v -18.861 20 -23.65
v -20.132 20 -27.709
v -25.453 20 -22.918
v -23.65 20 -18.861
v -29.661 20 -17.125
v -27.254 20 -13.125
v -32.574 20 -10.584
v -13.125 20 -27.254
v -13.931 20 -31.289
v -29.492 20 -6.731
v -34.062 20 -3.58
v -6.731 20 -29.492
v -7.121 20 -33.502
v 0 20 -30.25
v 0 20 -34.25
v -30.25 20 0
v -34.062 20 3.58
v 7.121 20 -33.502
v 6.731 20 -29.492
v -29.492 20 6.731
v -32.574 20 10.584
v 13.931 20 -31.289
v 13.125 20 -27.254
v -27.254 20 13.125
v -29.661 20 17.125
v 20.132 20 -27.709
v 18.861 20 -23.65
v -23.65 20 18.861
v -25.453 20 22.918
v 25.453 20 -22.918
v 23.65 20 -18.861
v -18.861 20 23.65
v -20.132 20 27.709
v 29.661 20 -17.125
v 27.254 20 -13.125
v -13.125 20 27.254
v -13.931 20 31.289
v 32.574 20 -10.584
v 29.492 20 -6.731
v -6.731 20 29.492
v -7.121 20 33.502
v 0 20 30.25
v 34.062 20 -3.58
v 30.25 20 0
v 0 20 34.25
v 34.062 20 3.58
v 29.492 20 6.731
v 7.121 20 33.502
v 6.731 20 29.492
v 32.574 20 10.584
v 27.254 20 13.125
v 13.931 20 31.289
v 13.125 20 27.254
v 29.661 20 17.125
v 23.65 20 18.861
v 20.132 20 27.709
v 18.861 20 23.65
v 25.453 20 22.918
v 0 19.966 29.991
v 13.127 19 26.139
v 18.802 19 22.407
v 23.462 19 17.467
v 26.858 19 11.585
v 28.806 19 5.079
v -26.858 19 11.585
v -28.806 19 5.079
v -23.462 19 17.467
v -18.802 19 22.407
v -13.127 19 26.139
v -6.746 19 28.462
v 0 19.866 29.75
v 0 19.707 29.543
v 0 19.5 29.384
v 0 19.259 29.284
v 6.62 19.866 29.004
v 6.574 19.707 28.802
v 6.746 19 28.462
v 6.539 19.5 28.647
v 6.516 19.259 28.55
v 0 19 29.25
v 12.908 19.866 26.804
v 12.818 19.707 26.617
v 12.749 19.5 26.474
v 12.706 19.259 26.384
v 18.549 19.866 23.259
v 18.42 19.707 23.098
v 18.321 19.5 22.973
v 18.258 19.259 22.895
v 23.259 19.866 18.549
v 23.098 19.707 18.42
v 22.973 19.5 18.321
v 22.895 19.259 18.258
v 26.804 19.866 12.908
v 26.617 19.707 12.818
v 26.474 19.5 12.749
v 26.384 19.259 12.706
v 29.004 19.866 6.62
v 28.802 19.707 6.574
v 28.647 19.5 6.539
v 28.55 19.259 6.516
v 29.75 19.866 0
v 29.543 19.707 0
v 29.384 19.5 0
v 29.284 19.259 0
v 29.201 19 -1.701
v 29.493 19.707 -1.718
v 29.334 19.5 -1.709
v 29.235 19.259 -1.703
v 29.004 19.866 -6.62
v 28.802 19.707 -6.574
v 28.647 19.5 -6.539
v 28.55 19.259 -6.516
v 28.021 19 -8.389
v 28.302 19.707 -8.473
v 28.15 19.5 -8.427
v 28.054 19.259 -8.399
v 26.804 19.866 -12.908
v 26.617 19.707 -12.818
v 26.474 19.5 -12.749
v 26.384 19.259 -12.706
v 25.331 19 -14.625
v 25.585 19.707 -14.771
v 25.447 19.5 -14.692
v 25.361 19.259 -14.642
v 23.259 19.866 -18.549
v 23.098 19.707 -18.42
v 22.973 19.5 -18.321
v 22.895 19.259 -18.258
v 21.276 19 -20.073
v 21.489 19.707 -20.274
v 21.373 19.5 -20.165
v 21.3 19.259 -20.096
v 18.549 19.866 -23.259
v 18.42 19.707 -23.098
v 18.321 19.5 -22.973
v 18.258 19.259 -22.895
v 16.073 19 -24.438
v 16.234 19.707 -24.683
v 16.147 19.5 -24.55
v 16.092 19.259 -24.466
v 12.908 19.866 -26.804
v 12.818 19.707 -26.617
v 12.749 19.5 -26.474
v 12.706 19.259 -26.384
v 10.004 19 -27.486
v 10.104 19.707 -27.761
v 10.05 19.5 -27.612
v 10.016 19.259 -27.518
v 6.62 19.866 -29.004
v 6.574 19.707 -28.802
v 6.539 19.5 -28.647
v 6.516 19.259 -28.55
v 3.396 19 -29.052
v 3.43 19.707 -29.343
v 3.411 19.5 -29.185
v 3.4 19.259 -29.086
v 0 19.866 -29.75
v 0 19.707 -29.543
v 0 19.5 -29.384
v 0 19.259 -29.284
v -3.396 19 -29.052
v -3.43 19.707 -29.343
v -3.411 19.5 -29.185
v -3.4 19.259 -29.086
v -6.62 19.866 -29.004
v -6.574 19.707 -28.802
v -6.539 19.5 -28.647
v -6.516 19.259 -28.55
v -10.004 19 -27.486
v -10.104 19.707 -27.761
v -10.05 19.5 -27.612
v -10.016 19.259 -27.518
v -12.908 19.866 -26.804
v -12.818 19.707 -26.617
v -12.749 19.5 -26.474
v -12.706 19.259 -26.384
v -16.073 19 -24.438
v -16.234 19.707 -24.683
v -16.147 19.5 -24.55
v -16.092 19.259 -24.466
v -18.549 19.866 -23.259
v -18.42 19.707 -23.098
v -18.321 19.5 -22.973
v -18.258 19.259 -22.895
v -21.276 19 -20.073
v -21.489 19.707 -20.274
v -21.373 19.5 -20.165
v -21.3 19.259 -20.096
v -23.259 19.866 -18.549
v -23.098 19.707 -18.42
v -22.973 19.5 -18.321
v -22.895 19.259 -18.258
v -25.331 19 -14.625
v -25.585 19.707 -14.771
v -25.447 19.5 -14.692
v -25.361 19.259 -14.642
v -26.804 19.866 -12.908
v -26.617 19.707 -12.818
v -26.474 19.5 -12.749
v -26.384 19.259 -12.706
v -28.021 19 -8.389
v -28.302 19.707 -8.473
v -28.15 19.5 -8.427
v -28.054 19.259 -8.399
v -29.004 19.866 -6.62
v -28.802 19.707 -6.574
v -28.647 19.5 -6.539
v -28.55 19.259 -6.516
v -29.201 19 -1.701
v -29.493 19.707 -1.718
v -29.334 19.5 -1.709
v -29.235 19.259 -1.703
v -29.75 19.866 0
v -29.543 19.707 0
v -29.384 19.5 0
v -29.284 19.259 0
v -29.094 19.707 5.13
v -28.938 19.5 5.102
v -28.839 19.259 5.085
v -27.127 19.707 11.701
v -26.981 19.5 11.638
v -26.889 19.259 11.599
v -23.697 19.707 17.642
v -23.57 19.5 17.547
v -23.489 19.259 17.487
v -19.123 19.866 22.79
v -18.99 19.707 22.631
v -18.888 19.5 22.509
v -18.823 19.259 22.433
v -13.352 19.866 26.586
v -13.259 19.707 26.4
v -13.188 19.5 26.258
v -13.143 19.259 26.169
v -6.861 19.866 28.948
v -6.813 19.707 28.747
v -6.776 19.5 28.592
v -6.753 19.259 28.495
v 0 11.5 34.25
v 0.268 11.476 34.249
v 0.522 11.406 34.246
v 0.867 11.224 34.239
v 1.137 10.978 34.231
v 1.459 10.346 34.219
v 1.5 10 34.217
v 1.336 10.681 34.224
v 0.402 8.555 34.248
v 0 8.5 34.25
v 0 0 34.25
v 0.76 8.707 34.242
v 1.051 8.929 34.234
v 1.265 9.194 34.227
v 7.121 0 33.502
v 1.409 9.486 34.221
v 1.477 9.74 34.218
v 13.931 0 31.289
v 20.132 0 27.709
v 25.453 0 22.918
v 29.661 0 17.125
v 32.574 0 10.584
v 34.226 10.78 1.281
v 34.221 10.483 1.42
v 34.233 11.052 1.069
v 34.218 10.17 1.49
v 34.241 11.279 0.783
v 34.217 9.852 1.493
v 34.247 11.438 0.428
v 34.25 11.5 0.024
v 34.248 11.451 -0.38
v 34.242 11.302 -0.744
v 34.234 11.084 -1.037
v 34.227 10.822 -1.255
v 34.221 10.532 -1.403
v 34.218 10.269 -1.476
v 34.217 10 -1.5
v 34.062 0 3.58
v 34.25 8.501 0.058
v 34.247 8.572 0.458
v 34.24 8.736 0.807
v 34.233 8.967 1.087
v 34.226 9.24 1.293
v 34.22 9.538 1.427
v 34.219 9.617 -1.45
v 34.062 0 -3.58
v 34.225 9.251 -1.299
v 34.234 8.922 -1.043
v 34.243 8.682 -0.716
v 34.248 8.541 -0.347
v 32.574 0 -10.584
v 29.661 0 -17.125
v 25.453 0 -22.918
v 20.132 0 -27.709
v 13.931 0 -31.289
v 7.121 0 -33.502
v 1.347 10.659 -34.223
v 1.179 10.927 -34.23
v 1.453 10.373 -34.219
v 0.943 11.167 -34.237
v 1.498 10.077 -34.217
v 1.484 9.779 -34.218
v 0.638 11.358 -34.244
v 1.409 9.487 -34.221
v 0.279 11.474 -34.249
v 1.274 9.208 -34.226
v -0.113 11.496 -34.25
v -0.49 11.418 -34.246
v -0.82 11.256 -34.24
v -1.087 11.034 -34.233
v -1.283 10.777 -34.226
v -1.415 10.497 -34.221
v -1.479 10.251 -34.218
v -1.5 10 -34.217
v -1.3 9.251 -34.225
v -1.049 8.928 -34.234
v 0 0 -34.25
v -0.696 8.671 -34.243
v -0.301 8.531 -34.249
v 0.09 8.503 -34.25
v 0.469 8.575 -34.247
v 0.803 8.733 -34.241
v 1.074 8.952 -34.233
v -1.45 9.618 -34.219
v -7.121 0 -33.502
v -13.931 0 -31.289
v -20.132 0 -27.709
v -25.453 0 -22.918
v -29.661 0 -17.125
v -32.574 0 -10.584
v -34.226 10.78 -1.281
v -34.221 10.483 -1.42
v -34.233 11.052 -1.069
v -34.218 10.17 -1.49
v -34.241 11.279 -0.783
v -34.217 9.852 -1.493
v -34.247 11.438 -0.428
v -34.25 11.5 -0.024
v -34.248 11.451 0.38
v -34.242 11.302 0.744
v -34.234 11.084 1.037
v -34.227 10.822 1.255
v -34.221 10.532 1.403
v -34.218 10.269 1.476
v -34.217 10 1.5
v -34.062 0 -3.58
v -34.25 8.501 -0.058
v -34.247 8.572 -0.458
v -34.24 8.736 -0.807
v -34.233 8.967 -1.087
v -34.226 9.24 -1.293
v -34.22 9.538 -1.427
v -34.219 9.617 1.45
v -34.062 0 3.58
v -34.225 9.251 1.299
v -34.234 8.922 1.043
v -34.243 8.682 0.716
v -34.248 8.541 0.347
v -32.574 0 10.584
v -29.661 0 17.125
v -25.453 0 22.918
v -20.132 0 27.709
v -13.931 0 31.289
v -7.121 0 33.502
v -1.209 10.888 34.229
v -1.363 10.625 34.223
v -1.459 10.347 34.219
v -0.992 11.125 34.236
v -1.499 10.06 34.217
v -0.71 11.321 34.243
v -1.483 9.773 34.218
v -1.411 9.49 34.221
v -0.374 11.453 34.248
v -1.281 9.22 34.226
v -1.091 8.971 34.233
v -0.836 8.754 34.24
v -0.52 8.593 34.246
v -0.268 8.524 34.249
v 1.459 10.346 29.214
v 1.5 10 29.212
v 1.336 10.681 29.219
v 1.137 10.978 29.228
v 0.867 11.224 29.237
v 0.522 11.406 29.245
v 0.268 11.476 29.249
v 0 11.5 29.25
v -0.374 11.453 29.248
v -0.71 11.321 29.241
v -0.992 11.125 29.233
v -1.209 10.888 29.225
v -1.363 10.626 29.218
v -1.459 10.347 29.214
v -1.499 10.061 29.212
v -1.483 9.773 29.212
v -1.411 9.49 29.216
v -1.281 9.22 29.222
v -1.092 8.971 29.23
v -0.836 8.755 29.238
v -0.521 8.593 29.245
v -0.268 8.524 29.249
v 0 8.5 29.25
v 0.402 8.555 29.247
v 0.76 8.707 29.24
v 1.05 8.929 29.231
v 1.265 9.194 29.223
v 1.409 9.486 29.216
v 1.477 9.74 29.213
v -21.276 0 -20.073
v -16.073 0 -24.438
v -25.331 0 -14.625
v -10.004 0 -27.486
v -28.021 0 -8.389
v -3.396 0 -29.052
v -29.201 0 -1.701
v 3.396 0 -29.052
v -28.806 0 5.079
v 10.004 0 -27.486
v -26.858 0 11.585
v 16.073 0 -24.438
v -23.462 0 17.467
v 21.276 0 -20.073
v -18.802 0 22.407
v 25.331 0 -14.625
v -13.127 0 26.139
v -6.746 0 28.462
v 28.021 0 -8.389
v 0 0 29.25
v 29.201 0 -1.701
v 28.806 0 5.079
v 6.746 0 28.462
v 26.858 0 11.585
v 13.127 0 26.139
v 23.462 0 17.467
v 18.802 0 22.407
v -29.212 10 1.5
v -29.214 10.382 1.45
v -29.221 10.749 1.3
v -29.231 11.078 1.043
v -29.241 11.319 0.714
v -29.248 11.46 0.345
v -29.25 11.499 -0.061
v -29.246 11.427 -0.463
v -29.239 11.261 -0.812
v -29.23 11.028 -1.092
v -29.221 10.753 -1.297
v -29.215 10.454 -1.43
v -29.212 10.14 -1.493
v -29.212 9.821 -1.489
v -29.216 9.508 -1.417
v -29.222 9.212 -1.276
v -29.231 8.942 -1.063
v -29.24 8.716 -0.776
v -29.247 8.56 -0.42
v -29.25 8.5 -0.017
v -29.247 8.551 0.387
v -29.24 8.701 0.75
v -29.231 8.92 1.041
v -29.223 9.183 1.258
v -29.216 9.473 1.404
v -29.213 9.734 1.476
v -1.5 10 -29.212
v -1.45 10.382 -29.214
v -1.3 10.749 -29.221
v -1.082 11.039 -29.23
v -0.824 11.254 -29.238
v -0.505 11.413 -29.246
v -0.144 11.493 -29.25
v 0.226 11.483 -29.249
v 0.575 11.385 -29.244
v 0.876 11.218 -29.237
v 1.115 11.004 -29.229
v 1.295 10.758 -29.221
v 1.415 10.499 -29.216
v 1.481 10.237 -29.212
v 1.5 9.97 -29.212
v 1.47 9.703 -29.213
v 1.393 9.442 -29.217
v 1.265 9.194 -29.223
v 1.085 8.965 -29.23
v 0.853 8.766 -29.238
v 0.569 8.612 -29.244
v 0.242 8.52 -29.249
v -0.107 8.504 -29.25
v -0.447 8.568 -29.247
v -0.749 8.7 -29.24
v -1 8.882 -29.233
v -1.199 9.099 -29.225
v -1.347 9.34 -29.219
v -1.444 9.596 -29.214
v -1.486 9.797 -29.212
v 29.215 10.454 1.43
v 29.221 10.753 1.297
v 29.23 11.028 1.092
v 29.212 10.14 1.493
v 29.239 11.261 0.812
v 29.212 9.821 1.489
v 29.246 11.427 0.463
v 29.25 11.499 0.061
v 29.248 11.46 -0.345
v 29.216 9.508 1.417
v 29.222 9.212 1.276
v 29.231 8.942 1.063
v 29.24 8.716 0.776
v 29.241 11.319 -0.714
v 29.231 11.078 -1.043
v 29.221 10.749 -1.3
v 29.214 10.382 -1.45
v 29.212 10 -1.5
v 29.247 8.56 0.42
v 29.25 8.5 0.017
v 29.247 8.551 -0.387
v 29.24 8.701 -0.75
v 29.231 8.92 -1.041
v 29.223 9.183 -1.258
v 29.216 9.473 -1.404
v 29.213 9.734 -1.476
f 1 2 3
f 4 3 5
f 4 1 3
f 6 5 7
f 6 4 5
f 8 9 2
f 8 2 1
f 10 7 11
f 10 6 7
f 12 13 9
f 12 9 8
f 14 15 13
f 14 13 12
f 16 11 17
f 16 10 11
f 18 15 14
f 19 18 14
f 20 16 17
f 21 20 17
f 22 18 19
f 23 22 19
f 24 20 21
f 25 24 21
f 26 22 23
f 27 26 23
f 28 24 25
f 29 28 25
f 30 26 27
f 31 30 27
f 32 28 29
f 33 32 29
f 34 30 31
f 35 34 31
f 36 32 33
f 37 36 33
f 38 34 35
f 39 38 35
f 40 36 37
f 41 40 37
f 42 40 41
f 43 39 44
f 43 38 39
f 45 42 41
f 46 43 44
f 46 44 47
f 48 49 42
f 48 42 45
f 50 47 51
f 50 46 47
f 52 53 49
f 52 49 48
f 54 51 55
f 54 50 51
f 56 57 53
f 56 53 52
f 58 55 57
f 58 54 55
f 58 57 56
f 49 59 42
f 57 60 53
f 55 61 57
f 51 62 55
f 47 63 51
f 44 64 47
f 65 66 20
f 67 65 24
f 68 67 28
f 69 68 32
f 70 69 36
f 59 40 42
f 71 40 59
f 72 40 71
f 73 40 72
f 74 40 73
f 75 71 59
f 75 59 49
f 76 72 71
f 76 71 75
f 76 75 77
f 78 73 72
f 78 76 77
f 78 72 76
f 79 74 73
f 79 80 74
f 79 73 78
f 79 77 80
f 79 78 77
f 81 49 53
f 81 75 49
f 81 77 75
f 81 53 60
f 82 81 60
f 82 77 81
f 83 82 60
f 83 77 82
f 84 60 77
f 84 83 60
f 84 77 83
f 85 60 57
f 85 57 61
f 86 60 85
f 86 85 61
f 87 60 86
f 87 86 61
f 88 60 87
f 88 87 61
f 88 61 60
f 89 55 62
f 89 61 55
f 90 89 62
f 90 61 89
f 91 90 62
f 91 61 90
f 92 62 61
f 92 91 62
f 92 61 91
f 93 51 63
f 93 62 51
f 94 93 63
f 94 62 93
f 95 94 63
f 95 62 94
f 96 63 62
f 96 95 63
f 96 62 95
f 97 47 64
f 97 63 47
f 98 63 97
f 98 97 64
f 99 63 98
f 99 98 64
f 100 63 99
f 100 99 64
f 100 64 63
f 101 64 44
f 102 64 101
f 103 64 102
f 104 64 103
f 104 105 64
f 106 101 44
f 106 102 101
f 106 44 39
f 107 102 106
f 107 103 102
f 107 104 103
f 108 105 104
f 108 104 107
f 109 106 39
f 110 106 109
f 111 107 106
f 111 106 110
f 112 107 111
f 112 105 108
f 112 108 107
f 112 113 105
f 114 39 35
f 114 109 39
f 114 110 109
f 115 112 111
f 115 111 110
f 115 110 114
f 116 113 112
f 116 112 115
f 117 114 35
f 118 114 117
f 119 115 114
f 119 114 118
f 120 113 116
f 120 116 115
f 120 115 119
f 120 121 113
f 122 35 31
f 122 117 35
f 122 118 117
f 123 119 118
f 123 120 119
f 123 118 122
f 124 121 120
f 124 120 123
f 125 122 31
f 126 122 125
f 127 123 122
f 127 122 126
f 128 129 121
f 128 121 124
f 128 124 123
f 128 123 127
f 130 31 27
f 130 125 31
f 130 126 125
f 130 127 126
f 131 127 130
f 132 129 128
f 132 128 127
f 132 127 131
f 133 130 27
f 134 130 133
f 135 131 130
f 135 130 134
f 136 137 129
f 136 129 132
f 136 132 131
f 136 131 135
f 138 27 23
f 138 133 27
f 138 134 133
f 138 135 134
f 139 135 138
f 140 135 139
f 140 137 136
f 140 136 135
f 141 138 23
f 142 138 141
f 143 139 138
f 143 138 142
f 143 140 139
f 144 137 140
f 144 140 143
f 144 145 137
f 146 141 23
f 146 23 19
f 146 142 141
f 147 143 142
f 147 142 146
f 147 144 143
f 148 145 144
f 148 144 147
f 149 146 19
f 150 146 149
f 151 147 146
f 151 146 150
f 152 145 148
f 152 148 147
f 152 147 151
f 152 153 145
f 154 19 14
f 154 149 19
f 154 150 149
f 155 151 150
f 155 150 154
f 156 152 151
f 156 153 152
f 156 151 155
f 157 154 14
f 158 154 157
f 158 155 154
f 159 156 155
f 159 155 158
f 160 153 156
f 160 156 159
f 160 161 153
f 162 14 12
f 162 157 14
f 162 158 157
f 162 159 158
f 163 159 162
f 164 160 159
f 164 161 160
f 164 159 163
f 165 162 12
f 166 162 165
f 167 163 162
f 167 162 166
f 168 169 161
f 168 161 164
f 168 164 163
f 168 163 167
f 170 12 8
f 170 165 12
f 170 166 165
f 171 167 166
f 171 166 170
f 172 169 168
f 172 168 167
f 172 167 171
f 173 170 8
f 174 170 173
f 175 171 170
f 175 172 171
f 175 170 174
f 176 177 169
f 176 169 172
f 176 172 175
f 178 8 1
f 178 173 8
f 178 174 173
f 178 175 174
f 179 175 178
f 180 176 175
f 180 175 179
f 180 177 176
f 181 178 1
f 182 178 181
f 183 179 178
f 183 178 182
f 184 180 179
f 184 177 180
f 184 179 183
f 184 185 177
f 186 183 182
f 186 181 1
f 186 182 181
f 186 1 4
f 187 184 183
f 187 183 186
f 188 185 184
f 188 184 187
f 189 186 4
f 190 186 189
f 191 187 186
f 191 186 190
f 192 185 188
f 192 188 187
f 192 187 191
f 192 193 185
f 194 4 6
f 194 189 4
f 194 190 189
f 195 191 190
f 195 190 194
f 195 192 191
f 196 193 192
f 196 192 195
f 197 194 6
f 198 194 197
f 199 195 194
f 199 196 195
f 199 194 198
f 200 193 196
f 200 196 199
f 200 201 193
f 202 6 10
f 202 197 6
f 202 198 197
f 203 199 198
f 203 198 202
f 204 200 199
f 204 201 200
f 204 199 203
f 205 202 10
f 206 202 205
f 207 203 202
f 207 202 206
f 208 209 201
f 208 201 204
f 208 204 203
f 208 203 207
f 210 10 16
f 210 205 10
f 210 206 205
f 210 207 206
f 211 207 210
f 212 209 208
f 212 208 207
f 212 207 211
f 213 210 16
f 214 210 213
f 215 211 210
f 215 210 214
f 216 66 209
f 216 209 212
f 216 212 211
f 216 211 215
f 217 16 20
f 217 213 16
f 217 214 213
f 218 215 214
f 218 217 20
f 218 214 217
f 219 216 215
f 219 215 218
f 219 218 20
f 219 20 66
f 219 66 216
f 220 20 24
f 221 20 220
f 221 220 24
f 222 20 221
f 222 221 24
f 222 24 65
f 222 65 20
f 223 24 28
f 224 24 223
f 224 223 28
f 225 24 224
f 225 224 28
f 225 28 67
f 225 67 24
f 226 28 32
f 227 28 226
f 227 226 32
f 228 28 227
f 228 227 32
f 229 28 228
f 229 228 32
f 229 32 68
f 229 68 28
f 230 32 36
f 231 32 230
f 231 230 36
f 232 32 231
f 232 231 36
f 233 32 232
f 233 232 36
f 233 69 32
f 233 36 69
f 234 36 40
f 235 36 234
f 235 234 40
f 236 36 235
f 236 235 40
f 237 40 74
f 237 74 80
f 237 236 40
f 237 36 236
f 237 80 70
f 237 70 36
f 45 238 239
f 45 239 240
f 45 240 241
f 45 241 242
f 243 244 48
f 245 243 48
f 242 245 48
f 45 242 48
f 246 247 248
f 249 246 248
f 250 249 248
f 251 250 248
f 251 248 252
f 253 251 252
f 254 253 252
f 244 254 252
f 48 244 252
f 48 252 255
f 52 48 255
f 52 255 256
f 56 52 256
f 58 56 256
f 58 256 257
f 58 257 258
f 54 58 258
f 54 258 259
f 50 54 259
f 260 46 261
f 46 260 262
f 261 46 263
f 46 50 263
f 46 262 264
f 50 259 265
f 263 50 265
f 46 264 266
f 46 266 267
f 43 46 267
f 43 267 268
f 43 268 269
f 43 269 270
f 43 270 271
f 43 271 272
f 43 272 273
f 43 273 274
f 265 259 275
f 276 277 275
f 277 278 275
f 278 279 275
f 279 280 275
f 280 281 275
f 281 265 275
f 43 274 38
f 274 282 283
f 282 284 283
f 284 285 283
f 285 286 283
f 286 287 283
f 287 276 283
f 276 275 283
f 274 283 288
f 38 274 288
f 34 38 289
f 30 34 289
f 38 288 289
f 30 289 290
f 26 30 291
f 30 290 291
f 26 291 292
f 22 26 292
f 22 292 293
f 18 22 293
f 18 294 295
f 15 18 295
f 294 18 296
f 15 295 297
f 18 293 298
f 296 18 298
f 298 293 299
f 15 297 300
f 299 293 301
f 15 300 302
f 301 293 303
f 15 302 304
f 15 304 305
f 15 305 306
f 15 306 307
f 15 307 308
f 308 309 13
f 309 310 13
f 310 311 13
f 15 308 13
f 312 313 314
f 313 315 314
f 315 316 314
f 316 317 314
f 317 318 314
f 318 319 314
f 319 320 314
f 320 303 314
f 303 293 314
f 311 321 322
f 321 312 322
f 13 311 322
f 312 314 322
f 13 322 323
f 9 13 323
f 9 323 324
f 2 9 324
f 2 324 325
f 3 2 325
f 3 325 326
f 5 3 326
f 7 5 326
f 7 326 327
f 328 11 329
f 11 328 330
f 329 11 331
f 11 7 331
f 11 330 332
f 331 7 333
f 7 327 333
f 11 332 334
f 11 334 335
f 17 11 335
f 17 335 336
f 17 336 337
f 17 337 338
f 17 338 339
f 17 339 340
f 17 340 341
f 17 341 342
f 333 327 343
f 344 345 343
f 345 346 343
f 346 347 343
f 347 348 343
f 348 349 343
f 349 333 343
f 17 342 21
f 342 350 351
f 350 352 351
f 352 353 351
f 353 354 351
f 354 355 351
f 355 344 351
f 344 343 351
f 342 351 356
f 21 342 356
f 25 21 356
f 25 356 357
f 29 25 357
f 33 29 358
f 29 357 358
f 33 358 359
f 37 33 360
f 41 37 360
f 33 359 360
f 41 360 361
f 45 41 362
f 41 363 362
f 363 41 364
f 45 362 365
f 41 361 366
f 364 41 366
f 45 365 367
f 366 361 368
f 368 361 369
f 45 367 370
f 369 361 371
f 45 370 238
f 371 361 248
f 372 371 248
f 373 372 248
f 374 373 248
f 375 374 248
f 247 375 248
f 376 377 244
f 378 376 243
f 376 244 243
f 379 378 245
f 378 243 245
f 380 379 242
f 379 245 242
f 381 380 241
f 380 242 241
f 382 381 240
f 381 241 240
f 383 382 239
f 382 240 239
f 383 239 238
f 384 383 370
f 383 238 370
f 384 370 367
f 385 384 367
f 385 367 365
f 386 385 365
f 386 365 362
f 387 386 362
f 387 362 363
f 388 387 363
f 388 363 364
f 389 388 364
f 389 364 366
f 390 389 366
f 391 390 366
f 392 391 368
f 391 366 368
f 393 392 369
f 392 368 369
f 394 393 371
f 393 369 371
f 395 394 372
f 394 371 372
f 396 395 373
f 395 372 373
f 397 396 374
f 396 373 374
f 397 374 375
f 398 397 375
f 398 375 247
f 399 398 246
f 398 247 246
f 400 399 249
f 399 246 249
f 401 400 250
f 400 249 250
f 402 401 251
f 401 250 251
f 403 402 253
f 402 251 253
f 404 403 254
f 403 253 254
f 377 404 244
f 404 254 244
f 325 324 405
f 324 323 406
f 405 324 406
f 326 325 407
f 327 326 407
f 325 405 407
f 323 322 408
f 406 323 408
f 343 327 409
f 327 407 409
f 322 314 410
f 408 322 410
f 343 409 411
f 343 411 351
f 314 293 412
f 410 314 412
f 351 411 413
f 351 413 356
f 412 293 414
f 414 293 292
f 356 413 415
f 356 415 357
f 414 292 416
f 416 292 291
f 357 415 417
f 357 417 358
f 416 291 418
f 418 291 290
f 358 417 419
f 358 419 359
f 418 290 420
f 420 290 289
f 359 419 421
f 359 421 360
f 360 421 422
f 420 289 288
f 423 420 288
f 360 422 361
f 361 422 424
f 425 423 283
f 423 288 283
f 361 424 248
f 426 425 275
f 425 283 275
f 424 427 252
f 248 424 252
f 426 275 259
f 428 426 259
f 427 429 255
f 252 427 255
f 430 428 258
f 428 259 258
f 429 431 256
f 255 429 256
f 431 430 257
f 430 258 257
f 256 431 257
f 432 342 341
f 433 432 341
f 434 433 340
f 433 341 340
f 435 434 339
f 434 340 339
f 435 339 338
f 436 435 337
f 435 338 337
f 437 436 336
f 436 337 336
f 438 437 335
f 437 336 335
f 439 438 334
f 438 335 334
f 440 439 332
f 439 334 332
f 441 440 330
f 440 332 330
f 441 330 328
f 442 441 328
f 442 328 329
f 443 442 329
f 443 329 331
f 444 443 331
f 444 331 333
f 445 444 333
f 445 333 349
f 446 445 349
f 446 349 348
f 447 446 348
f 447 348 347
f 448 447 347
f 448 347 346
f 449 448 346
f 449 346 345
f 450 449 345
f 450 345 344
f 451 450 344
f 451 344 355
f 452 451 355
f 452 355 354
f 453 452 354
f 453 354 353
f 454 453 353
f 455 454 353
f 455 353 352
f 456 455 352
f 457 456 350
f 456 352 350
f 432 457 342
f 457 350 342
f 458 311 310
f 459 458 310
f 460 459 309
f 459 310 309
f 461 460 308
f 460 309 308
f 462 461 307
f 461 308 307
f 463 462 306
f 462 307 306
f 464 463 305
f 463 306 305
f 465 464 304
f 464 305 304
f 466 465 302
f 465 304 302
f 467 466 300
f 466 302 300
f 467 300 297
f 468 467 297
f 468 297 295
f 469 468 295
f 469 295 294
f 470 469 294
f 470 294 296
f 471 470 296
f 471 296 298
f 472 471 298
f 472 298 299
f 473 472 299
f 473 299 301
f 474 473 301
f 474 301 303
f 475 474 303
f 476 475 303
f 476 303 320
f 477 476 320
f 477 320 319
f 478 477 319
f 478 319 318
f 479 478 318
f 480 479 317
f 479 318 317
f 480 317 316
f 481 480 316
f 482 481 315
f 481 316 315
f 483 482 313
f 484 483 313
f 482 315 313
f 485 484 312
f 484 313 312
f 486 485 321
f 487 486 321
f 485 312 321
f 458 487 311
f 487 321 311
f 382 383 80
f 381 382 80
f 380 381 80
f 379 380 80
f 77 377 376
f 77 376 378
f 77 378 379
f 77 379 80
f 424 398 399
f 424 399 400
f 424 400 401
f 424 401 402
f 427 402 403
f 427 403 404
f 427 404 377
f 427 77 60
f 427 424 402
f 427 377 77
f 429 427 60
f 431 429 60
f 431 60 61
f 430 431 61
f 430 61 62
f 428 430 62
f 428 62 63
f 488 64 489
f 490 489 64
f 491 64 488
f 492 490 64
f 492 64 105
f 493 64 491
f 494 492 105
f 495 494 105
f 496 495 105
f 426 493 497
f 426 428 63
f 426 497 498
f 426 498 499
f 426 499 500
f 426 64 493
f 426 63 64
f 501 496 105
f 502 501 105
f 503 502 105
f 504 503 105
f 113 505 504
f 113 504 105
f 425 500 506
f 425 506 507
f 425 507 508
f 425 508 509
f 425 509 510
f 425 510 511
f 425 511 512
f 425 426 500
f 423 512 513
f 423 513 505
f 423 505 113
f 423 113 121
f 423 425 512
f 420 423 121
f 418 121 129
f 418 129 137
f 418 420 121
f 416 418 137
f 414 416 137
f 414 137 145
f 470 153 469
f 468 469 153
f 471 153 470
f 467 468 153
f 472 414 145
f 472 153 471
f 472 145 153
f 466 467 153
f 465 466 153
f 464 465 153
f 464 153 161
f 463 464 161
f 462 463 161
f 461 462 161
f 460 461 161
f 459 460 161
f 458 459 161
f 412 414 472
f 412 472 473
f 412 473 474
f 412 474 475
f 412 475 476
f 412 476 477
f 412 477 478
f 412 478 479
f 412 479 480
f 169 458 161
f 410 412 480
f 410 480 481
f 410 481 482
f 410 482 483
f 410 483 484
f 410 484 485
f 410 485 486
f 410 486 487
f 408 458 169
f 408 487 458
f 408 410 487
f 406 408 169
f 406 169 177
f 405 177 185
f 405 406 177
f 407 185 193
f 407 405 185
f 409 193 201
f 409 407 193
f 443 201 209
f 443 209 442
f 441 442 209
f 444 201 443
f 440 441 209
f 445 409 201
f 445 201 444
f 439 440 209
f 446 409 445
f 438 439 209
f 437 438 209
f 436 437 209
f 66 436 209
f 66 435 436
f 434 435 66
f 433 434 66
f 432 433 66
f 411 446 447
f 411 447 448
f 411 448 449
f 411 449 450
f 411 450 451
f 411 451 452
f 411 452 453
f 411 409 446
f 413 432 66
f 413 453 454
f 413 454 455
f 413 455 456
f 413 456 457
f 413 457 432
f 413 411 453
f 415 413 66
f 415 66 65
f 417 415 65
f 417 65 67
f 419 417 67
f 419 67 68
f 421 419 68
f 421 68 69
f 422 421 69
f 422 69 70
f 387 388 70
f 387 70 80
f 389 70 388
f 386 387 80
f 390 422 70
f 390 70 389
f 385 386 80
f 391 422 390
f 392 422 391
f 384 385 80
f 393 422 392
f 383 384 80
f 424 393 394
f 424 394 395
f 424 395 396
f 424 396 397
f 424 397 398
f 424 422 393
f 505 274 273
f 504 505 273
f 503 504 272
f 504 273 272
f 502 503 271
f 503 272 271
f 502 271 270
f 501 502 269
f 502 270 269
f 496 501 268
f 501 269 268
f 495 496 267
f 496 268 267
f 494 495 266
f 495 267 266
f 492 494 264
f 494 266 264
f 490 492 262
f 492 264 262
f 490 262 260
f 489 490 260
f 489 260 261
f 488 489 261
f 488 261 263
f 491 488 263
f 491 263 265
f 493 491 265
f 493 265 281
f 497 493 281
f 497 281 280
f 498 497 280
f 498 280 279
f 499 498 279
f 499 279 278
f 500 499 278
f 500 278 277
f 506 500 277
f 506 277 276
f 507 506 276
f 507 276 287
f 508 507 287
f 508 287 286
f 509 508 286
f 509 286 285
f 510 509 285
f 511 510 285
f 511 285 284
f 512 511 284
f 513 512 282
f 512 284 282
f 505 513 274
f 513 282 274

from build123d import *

# Parameters (mm, degrees)
SKETCH1_R           = 34.25
SKETCH1_R_2         = 29.25
BOSS_EXTRUDE1_DEPTH = 20
SKETCH2_R           = 1.5
CUT_EXTRUDE1_DEPTH  = 20
CIRPATTERN1_COUNT   = 4
FILLET1_R           = 1


with BuildPart() as part:
    # Sketch1 → Boss-Extrude1 (new body)
    with BuildSketch(Plane(origin=(0, 0, 0), x_dir=(1, 0, 0), z_dir=(0, 1, 0))):
        with Locations(Location((0, 0, 0), (0, 0, 270))):
            Circle(SKETCH1_R)
        with Locations(Location((0, 0, 0), (0, 0, 270))):
            Circle(SKETCH1_R_2, mode=Mode.SUBTRACT)
    extrude(amount=BOSS_EXTRUDE1_DEPTH)

    # Sketch2 → Cut-Extrude1 (cut)
    with BuildSketch(Plane.ZY.offset(34.25)):
        with Locations((0, 10)):
            Circle(SKETCH2_R)
    cut_extrude1 = extrude(amount=-CUT_EXTRUDE1_DEPTH, mode=Mode.SUBTRACT)

    # CirPattern1: Cut-Extrude1 ×4 about axis
    cirpattern1_axis = Axis((0, 20, 0), (0, -1, 0))
    for i in range(1, CIRPATTERN1_COUNT):
        add(cut_extrude1.rotate(cirpattern1_axis, i * 360 / CIRPATTERN1_COUNT), mode=Mode.SUBTRACT)

    # Fillet1
    fillet1_edges = [part.edges().sort_by_distance(p)[0] for p in [
        (0, 20, -29.25),
    ]]
    fillet(fillet1_edges, radius=FILLET1_R)


solid = part.part
